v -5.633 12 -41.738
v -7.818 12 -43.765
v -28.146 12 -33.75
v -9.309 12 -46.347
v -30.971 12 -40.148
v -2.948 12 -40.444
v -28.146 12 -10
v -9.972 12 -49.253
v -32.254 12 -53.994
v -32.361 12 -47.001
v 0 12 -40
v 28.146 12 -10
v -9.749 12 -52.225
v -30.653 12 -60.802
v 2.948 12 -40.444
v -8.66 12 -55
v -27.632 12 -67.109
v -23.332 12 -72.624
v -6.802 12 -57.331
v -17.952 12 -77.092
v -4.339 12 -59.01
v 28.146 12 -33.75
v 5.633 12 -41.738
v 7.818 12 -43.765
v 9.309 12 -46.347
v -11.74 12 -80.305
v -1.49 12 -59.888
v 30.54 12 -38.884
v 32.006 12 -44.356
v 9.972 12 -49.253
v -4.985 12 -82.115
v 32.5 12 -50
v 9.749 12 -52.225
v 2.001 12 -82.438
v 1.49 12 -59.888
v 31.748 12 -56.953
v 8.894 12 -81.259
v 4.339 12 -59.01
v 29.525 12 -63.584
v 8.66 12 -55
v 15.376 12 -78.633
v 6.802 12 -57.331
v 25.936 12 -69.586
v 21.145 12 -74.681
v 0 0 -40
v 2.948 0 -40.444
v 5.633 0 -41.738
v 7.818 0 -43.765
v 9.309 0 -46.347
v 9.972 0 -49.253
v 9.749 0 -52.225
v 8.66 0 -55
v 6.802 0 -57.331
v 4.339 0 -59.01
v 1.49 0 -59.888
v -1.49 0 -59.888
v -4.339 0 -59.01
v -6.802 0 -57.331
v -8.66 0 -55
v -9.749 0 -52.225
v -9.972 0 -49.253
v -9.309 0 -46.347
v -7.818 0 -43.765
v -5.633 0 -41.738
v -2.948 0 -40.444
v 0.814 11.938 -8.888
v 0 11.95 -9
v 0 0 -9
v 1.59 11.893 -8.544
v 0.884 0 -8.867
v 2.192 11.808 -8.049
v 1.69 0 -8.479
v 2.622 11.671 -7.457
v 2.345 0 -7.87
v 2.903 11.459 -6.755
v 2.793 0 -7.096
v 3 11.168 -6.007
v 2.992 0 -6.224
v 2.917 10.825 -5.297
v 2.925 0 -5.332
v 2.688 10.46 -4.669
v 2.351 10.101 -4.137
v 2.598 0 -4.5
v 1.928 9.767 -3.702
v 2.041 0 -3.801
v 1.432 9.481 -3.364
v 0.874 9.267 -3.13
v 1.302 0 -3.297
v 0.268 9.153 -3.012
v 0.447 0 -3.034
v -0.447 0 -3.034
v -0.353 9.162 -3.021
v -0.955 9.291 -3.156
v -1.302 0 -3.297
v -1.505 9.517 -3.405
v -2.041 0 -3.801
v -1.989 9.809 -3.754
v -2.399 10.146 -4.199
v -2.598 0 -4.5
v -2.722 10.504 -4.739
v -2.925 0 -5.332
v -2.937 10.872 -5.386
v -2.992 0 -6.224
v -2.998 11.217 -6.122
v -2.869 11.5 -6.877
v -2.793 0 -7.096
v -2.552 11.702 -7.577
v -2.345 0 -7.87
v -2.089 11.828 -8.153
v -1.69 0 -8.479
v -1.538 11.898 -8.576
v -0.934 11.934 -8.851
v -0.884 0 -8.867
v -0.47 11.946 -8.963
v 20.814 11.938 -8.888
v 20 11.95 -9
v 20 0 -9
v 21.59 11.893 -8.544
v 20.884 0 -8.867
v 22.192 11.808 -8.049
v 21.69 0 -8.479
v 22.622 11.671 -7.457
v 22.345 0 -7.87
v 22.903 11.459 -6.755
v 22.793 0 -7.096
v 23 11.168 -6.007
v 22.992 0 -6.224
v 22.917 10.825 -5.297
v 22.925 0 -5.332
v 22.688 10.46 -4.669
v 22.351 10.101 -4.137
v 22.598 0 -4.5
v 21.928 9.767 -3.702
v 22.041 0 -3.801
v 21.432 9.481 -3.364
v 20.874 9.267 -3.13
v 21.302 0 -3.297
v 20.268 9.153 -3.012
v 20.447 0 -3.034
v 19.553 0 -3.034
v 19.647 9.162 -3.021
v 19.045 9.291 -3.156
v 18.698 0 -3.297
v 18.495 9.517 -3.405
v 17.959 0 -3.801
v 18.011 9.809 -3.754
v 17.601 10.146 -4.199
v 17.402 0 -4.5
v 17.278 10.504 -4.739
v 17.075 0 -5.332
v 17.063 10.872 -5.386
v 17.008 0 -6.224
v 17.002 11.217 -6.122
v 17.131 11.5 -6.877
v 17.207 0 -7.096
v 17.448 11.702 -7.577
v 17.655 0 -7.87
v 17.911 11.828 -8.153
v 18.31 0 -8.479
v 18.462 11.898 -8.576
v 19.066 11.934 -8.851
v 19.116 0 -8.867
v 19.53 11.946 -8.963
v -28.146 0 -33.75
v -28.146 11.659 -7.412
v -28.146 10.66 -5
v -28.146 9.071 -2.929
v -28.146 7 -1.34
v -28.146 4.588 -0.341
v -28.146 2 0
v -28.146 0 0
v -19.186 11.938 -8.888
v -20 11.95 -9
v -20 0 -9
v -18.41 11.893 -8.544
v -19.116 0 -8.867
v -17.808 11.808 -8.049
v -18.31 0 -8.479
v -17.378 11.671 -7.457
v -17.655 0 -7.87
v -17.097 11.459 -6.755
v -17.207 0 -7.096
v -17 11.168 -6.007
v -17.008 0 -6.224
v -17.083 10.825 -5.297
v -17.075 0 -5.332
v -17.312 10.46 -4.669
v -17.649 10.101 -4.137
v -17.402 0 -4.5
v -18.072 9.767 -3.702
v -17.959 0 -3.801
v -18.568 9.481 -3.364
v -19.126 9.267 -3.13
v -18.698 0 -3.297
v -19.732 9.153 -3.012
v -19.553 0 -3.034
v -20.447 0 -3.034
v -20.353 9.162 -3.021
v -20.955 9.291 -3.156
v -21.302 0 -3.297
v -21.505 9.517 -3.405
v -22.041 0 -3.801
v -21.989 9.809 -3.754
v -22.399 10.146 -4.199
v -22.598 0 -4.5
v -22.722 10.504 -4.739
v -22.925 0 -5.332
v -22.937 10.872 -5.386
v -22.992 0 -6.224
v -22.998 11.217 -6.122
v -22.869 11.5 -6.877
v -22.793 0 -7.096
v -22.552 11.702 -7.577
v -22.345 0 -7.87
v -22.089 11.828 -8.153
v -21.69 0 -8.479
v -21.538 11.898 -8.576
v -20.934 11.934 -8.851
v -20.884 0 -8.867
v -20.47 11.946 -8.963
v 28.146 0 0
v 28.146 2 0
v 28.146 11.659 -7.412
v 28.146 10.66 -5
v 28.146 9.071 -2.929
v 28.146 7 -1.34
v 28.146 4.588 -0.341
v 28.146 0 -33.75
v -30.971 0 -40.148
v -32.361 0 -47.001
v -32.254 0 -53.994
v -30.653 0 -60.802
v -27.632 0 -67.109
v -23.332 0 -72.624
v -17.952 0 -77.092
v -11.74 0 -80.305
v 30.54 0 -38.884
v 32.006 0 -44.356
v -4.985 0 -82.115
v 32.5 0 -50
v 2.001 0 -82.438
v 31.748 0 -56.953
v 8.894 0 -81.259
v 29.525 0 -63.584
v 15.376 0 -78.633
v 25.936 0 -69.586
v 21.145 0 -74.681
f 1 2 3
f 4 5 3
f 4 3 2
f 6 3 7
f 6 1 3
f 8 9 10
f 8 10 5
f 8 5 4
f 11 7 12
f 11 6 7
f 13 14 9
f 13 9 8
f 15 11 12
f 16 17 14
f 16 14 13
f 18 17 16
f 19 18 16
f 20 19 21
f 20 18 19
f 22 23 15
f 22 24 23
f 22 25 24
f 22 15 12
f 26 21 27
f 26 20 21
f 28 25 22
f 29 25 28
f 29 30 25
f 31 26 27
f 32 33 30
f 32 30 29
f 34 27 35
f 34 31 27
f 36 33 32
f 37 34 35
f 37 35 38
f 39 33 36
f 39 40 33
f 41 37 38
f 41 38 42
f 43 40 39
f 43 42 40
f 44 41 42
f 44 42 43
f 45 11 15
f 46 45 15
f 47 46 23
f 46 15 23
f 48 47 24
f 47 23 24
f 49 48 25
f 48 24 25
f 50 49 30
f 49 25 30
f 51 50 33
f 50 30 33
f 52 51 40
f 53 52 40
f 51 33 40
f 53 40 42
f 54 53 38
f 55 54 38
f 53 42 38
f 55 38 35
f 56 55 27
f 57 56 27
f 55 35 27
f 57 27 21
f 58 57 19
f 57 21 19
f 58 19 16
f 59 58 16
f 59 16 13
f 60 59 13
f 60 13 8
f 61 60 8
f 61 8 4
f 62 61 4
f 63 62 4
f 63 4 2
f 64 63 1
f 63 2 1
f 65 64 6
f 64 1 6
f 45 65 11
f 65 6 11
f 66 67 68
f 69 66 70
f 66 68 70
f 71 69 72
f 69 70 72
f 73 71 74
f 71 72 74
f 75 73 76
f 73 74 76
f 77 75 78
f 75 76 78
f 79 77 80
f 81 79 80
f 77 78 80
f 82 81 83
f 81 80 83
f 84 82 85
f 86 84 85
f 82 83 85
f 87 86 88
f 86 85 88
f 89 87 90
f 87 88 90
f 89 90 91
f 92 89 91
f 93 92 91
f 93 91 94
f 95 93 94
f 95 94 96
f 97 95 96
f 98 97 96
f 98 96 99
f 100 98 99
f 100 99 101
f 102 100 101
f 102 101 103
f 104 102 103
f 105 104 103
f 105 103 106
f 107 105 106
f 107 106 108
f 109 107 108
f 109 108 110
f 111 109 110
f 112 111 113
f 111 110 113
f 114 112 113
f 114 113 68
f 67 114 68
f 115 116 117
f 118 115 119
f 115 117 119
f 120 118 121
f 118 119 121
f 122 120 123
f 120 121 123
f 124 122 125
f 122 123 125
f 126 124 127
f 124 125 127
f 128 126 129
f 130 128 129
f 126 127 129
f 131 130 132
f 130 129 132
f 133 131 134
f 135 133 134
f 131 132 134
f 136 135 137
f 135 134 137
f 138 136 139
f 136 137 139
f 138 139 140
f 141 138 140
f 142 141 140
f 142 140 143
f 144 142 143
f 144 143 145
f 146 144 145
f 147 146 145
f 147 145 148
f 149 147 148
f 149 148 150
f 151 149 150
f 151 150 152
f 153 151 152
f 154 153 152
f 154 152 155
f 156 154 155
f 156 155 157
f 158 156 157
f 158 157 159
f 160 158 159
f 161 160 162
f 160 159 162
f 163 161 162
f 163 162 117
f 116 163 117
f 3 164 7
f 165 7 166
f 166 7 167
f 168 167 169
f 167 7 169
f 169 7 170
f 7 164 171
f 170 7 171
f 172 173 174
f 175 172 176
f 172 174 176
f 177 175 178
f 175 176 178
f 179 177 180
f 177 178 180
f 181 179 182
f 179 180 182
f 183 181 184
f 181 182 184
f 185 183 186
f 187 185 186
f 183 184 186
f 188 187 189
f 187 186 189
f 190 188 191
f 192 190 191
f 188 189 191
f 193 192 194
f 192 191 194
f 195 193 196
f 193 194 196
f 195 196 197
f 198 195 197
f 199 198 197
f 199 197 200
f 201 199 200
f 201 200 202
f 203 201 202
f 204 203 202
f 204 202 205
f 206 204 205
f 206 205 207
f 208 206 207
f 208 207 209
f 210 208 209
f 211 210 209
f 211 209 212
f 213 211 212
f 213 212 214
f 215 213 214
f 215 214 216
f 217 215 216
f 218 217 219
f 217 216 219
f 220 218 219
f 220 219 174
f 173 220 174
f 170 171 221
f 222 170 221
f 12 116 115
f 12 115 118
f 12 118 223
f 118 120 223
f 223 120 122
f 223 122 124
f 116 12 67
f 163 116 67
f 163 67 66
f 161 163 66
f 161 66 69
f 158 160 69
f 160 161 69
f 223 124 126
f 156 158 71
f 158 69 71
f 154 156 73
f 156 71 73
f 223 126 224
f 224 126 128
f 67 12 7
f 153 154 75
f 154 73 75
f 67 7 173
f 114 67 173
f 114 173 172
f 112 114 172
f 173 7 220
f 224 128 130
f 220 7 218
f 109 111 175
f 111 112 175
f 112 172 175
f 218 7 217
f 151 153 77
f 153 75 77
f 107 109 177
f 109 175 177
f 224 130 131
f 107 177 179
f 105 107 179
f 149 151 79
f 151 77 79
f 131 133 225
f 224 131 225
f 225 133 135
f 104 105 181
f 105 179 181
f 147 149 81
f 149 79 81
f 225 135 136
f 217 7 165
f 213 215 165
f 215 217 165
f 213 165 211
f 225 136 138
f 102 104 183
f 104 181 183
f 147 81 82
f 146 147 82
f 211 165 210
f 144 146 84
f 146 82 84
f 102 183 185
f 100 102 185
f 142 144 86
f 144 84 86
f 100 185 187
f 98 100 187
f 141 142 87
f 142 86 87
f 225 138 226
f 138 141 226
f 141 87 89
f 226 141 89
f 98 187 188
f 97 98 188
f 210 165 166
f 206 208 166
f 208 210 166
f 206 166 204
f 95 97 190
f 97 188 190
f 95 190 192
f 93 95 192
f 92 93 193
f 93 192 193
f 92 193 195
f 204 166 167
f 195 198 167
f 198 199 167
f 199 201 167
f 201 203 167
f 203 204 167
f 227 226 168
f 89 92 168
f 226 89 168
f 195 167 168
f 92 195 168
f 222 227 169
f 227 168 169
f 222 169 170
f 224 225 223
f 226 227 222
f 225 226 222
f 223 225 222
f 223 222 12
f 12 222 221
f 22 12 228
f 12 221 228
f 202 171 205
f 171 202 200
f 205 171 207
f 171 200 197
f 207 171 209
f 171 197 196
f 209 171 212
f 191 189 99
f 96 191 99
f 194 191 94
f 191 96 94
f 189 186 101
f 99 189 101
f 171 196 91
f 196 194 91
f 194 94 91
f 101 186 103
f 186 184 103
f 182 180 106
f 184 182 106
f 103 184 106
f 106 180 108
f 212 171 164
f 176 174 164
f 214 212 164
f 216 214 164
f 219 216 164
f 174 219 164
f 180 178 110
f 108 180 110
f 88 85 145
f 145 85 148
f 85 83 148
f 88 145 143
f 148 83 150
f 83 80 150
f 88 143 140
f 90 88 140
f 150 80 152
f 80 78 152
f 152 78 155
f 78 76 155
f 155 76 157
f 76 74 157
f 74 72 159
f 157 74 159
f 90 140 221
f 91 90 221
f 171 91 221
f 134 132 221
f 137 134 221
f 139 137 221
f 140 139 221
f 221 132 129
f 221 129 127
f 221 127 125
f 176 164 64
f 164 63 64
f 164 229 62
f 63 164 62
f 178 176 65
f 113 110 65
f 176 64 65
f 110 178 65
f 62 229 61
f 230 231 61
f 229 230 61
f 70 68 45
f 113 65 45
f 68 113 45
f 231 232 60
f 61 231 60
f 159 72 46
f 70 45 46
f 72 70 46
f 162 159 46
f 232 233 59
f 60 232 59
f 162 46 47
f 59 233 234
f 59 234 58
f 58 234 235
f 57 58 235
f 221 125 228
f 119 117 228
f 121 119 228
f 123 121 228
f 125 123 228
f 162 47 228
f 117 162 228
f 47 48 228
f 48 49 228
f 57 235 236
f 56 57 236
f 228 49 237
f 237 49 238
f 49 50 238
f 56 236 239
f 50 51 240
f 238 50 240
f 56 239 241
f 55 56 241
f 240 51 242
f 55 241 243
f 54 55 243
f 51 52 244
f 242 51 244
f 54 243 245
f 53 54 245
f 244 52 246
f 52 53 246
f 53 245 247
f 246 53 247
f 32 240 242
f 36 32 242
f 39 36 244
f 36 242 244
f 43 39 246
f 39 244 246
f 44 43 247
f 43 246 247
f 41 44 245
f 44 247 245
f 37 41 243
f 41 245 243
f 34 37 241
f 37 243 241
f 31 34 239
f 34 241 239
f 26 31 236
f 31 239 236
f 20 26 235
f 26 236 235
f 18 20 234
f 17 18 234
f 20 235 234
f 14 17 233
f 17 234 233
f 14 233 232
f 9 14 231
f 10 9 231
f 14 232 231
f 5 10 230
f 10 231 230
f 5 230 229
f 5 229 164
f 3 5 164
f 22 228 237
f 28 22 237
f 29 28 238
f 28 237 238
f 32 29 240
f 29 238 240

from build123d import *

# Parameters (mm, degrees)
EXTRUDE_1_DEPTH     = 12
SKETCH_2_R          = 3
CUT_EXTRUDE_1_DEPTH = 12
FILLET_1_R          = 10
SKETCH_3_R          = 10
CUT_EXTRUDE_2_DEPTH = 12


with BuildPart() as part:
    # 草图1 → 凸台-拉伸1 (new body)
    with BuildSketch(Plane(origin=(0, 0, 0), x_dir=(1, 0, 0), z_dir=(0, 1, 0))):
        with BuildLine():
            Line((-28.145825623, 33.75), (0, 50))
            Line((0, 50), (28.145825623, 33.75))
            ThreePointArc((28.145825623, 33.75), (31.392589354, 41.588381034), (32.5, 50))
            ThreePointArc((32.5, 50), (-8.411618966, 81.392589354), (-28.145825623, 33.75))
        make_face()
        with BuildLine():
            Line((0, 50), (0, 17.5))
            ThreePointArc((0, 17.5), (16.25, 21.854174377), (28.145825623, 33.75))
            Line((28.145825623, 33.75), (0, 50))
        make_face()
        with BuildLine():
            ThreePointArc((-28.145825623, 33.75), (-16.25, 21.854174377), (0, 17.5))
            Line((0, 17.5), (0, 50))
            Line((0, 50), (-28.145825623, 33.75))
        make_face()
        with BuildLine():
            Line((-28.145825623, 0), (0, 0))
            Line((0, 0), (0, 17.5))
            ThreePointArc((0, 17.5), (-16.25, 21.854174377), (-28.145825623, 33.75))
            Line((-28.145825623, 33.75), (-28.145825623, 0))
        make_face()
        with BuildLine():
            Line((0, 17.5), (0, 0))
            Line((0, 0), (28.145825623, 0))
            Line((28.145825623, 0), (28.145825623, 33.75))
            ThreePointArc((28.145825623, 33.75), (16.25, 21.854174377), (0, 17.5))
        make_face()
    extrude(amount=EXTRUDE_1_DEPTH)

    # 草图2 → 切除-拉伸1 (cut)
    with BuildSketch(Plane(origin=(0, 0, 0), x_dir=(-1, 0, 0), z_dir=(0, -1, 0))):
        with Locations(Location((0, 6, 0), (0, 0, 90))):
            Circle(SKETCH_2_R)
        with Locations(Location((20, 6, 0), (0, 0, 90))):
            Circle(SKETCH_2_R)
        with Locations(Location((-20, 6, 0), (0, 0, 90))):
            Circle(SKETCH_2_R)
    extrude(amount=-CUT_EXTRUDE_1_DEPTH, mode=Mode.SUBTRACT)

    # 圆角1
    # the kernel refuses this fillet: 10 mm, written as the material it takes off along each edge
    with BuildSketch(Plane(origin=(-53.145825623, 12, 0), x_dir=(0, 0, -1), z_dir=(1, 0, 0))) as fillet_1_piece_1:
        with BuildLine():
            CenterArc((FILLET_1_R, -FILLET_1_R), FILLET_1_R, 90, 90)
            Line((0, -FILLET_1_R), (0, 0))
            Line((0, 0), (FILLET_1_R, 0))
        make_face()
    extrude(amount=106.291651246, mode=Mode.SUBTRACT)

    # 草图3 → 切除-拉伸2 (cut)
    with BuildSketch(Plane(origin=(0, 12, 0), x_dir=(1, 0, 0), z_dir=(0, 1, 0))):
        with Locations(Location((0, 50, 0), (0, 0, 270))):
            Circle(SKETCH_3_R)
    extrude(amount=-CUT_EXTRUDE_2_DEPTH, mode=Mode.SUBTRACT)


solid = part.part
